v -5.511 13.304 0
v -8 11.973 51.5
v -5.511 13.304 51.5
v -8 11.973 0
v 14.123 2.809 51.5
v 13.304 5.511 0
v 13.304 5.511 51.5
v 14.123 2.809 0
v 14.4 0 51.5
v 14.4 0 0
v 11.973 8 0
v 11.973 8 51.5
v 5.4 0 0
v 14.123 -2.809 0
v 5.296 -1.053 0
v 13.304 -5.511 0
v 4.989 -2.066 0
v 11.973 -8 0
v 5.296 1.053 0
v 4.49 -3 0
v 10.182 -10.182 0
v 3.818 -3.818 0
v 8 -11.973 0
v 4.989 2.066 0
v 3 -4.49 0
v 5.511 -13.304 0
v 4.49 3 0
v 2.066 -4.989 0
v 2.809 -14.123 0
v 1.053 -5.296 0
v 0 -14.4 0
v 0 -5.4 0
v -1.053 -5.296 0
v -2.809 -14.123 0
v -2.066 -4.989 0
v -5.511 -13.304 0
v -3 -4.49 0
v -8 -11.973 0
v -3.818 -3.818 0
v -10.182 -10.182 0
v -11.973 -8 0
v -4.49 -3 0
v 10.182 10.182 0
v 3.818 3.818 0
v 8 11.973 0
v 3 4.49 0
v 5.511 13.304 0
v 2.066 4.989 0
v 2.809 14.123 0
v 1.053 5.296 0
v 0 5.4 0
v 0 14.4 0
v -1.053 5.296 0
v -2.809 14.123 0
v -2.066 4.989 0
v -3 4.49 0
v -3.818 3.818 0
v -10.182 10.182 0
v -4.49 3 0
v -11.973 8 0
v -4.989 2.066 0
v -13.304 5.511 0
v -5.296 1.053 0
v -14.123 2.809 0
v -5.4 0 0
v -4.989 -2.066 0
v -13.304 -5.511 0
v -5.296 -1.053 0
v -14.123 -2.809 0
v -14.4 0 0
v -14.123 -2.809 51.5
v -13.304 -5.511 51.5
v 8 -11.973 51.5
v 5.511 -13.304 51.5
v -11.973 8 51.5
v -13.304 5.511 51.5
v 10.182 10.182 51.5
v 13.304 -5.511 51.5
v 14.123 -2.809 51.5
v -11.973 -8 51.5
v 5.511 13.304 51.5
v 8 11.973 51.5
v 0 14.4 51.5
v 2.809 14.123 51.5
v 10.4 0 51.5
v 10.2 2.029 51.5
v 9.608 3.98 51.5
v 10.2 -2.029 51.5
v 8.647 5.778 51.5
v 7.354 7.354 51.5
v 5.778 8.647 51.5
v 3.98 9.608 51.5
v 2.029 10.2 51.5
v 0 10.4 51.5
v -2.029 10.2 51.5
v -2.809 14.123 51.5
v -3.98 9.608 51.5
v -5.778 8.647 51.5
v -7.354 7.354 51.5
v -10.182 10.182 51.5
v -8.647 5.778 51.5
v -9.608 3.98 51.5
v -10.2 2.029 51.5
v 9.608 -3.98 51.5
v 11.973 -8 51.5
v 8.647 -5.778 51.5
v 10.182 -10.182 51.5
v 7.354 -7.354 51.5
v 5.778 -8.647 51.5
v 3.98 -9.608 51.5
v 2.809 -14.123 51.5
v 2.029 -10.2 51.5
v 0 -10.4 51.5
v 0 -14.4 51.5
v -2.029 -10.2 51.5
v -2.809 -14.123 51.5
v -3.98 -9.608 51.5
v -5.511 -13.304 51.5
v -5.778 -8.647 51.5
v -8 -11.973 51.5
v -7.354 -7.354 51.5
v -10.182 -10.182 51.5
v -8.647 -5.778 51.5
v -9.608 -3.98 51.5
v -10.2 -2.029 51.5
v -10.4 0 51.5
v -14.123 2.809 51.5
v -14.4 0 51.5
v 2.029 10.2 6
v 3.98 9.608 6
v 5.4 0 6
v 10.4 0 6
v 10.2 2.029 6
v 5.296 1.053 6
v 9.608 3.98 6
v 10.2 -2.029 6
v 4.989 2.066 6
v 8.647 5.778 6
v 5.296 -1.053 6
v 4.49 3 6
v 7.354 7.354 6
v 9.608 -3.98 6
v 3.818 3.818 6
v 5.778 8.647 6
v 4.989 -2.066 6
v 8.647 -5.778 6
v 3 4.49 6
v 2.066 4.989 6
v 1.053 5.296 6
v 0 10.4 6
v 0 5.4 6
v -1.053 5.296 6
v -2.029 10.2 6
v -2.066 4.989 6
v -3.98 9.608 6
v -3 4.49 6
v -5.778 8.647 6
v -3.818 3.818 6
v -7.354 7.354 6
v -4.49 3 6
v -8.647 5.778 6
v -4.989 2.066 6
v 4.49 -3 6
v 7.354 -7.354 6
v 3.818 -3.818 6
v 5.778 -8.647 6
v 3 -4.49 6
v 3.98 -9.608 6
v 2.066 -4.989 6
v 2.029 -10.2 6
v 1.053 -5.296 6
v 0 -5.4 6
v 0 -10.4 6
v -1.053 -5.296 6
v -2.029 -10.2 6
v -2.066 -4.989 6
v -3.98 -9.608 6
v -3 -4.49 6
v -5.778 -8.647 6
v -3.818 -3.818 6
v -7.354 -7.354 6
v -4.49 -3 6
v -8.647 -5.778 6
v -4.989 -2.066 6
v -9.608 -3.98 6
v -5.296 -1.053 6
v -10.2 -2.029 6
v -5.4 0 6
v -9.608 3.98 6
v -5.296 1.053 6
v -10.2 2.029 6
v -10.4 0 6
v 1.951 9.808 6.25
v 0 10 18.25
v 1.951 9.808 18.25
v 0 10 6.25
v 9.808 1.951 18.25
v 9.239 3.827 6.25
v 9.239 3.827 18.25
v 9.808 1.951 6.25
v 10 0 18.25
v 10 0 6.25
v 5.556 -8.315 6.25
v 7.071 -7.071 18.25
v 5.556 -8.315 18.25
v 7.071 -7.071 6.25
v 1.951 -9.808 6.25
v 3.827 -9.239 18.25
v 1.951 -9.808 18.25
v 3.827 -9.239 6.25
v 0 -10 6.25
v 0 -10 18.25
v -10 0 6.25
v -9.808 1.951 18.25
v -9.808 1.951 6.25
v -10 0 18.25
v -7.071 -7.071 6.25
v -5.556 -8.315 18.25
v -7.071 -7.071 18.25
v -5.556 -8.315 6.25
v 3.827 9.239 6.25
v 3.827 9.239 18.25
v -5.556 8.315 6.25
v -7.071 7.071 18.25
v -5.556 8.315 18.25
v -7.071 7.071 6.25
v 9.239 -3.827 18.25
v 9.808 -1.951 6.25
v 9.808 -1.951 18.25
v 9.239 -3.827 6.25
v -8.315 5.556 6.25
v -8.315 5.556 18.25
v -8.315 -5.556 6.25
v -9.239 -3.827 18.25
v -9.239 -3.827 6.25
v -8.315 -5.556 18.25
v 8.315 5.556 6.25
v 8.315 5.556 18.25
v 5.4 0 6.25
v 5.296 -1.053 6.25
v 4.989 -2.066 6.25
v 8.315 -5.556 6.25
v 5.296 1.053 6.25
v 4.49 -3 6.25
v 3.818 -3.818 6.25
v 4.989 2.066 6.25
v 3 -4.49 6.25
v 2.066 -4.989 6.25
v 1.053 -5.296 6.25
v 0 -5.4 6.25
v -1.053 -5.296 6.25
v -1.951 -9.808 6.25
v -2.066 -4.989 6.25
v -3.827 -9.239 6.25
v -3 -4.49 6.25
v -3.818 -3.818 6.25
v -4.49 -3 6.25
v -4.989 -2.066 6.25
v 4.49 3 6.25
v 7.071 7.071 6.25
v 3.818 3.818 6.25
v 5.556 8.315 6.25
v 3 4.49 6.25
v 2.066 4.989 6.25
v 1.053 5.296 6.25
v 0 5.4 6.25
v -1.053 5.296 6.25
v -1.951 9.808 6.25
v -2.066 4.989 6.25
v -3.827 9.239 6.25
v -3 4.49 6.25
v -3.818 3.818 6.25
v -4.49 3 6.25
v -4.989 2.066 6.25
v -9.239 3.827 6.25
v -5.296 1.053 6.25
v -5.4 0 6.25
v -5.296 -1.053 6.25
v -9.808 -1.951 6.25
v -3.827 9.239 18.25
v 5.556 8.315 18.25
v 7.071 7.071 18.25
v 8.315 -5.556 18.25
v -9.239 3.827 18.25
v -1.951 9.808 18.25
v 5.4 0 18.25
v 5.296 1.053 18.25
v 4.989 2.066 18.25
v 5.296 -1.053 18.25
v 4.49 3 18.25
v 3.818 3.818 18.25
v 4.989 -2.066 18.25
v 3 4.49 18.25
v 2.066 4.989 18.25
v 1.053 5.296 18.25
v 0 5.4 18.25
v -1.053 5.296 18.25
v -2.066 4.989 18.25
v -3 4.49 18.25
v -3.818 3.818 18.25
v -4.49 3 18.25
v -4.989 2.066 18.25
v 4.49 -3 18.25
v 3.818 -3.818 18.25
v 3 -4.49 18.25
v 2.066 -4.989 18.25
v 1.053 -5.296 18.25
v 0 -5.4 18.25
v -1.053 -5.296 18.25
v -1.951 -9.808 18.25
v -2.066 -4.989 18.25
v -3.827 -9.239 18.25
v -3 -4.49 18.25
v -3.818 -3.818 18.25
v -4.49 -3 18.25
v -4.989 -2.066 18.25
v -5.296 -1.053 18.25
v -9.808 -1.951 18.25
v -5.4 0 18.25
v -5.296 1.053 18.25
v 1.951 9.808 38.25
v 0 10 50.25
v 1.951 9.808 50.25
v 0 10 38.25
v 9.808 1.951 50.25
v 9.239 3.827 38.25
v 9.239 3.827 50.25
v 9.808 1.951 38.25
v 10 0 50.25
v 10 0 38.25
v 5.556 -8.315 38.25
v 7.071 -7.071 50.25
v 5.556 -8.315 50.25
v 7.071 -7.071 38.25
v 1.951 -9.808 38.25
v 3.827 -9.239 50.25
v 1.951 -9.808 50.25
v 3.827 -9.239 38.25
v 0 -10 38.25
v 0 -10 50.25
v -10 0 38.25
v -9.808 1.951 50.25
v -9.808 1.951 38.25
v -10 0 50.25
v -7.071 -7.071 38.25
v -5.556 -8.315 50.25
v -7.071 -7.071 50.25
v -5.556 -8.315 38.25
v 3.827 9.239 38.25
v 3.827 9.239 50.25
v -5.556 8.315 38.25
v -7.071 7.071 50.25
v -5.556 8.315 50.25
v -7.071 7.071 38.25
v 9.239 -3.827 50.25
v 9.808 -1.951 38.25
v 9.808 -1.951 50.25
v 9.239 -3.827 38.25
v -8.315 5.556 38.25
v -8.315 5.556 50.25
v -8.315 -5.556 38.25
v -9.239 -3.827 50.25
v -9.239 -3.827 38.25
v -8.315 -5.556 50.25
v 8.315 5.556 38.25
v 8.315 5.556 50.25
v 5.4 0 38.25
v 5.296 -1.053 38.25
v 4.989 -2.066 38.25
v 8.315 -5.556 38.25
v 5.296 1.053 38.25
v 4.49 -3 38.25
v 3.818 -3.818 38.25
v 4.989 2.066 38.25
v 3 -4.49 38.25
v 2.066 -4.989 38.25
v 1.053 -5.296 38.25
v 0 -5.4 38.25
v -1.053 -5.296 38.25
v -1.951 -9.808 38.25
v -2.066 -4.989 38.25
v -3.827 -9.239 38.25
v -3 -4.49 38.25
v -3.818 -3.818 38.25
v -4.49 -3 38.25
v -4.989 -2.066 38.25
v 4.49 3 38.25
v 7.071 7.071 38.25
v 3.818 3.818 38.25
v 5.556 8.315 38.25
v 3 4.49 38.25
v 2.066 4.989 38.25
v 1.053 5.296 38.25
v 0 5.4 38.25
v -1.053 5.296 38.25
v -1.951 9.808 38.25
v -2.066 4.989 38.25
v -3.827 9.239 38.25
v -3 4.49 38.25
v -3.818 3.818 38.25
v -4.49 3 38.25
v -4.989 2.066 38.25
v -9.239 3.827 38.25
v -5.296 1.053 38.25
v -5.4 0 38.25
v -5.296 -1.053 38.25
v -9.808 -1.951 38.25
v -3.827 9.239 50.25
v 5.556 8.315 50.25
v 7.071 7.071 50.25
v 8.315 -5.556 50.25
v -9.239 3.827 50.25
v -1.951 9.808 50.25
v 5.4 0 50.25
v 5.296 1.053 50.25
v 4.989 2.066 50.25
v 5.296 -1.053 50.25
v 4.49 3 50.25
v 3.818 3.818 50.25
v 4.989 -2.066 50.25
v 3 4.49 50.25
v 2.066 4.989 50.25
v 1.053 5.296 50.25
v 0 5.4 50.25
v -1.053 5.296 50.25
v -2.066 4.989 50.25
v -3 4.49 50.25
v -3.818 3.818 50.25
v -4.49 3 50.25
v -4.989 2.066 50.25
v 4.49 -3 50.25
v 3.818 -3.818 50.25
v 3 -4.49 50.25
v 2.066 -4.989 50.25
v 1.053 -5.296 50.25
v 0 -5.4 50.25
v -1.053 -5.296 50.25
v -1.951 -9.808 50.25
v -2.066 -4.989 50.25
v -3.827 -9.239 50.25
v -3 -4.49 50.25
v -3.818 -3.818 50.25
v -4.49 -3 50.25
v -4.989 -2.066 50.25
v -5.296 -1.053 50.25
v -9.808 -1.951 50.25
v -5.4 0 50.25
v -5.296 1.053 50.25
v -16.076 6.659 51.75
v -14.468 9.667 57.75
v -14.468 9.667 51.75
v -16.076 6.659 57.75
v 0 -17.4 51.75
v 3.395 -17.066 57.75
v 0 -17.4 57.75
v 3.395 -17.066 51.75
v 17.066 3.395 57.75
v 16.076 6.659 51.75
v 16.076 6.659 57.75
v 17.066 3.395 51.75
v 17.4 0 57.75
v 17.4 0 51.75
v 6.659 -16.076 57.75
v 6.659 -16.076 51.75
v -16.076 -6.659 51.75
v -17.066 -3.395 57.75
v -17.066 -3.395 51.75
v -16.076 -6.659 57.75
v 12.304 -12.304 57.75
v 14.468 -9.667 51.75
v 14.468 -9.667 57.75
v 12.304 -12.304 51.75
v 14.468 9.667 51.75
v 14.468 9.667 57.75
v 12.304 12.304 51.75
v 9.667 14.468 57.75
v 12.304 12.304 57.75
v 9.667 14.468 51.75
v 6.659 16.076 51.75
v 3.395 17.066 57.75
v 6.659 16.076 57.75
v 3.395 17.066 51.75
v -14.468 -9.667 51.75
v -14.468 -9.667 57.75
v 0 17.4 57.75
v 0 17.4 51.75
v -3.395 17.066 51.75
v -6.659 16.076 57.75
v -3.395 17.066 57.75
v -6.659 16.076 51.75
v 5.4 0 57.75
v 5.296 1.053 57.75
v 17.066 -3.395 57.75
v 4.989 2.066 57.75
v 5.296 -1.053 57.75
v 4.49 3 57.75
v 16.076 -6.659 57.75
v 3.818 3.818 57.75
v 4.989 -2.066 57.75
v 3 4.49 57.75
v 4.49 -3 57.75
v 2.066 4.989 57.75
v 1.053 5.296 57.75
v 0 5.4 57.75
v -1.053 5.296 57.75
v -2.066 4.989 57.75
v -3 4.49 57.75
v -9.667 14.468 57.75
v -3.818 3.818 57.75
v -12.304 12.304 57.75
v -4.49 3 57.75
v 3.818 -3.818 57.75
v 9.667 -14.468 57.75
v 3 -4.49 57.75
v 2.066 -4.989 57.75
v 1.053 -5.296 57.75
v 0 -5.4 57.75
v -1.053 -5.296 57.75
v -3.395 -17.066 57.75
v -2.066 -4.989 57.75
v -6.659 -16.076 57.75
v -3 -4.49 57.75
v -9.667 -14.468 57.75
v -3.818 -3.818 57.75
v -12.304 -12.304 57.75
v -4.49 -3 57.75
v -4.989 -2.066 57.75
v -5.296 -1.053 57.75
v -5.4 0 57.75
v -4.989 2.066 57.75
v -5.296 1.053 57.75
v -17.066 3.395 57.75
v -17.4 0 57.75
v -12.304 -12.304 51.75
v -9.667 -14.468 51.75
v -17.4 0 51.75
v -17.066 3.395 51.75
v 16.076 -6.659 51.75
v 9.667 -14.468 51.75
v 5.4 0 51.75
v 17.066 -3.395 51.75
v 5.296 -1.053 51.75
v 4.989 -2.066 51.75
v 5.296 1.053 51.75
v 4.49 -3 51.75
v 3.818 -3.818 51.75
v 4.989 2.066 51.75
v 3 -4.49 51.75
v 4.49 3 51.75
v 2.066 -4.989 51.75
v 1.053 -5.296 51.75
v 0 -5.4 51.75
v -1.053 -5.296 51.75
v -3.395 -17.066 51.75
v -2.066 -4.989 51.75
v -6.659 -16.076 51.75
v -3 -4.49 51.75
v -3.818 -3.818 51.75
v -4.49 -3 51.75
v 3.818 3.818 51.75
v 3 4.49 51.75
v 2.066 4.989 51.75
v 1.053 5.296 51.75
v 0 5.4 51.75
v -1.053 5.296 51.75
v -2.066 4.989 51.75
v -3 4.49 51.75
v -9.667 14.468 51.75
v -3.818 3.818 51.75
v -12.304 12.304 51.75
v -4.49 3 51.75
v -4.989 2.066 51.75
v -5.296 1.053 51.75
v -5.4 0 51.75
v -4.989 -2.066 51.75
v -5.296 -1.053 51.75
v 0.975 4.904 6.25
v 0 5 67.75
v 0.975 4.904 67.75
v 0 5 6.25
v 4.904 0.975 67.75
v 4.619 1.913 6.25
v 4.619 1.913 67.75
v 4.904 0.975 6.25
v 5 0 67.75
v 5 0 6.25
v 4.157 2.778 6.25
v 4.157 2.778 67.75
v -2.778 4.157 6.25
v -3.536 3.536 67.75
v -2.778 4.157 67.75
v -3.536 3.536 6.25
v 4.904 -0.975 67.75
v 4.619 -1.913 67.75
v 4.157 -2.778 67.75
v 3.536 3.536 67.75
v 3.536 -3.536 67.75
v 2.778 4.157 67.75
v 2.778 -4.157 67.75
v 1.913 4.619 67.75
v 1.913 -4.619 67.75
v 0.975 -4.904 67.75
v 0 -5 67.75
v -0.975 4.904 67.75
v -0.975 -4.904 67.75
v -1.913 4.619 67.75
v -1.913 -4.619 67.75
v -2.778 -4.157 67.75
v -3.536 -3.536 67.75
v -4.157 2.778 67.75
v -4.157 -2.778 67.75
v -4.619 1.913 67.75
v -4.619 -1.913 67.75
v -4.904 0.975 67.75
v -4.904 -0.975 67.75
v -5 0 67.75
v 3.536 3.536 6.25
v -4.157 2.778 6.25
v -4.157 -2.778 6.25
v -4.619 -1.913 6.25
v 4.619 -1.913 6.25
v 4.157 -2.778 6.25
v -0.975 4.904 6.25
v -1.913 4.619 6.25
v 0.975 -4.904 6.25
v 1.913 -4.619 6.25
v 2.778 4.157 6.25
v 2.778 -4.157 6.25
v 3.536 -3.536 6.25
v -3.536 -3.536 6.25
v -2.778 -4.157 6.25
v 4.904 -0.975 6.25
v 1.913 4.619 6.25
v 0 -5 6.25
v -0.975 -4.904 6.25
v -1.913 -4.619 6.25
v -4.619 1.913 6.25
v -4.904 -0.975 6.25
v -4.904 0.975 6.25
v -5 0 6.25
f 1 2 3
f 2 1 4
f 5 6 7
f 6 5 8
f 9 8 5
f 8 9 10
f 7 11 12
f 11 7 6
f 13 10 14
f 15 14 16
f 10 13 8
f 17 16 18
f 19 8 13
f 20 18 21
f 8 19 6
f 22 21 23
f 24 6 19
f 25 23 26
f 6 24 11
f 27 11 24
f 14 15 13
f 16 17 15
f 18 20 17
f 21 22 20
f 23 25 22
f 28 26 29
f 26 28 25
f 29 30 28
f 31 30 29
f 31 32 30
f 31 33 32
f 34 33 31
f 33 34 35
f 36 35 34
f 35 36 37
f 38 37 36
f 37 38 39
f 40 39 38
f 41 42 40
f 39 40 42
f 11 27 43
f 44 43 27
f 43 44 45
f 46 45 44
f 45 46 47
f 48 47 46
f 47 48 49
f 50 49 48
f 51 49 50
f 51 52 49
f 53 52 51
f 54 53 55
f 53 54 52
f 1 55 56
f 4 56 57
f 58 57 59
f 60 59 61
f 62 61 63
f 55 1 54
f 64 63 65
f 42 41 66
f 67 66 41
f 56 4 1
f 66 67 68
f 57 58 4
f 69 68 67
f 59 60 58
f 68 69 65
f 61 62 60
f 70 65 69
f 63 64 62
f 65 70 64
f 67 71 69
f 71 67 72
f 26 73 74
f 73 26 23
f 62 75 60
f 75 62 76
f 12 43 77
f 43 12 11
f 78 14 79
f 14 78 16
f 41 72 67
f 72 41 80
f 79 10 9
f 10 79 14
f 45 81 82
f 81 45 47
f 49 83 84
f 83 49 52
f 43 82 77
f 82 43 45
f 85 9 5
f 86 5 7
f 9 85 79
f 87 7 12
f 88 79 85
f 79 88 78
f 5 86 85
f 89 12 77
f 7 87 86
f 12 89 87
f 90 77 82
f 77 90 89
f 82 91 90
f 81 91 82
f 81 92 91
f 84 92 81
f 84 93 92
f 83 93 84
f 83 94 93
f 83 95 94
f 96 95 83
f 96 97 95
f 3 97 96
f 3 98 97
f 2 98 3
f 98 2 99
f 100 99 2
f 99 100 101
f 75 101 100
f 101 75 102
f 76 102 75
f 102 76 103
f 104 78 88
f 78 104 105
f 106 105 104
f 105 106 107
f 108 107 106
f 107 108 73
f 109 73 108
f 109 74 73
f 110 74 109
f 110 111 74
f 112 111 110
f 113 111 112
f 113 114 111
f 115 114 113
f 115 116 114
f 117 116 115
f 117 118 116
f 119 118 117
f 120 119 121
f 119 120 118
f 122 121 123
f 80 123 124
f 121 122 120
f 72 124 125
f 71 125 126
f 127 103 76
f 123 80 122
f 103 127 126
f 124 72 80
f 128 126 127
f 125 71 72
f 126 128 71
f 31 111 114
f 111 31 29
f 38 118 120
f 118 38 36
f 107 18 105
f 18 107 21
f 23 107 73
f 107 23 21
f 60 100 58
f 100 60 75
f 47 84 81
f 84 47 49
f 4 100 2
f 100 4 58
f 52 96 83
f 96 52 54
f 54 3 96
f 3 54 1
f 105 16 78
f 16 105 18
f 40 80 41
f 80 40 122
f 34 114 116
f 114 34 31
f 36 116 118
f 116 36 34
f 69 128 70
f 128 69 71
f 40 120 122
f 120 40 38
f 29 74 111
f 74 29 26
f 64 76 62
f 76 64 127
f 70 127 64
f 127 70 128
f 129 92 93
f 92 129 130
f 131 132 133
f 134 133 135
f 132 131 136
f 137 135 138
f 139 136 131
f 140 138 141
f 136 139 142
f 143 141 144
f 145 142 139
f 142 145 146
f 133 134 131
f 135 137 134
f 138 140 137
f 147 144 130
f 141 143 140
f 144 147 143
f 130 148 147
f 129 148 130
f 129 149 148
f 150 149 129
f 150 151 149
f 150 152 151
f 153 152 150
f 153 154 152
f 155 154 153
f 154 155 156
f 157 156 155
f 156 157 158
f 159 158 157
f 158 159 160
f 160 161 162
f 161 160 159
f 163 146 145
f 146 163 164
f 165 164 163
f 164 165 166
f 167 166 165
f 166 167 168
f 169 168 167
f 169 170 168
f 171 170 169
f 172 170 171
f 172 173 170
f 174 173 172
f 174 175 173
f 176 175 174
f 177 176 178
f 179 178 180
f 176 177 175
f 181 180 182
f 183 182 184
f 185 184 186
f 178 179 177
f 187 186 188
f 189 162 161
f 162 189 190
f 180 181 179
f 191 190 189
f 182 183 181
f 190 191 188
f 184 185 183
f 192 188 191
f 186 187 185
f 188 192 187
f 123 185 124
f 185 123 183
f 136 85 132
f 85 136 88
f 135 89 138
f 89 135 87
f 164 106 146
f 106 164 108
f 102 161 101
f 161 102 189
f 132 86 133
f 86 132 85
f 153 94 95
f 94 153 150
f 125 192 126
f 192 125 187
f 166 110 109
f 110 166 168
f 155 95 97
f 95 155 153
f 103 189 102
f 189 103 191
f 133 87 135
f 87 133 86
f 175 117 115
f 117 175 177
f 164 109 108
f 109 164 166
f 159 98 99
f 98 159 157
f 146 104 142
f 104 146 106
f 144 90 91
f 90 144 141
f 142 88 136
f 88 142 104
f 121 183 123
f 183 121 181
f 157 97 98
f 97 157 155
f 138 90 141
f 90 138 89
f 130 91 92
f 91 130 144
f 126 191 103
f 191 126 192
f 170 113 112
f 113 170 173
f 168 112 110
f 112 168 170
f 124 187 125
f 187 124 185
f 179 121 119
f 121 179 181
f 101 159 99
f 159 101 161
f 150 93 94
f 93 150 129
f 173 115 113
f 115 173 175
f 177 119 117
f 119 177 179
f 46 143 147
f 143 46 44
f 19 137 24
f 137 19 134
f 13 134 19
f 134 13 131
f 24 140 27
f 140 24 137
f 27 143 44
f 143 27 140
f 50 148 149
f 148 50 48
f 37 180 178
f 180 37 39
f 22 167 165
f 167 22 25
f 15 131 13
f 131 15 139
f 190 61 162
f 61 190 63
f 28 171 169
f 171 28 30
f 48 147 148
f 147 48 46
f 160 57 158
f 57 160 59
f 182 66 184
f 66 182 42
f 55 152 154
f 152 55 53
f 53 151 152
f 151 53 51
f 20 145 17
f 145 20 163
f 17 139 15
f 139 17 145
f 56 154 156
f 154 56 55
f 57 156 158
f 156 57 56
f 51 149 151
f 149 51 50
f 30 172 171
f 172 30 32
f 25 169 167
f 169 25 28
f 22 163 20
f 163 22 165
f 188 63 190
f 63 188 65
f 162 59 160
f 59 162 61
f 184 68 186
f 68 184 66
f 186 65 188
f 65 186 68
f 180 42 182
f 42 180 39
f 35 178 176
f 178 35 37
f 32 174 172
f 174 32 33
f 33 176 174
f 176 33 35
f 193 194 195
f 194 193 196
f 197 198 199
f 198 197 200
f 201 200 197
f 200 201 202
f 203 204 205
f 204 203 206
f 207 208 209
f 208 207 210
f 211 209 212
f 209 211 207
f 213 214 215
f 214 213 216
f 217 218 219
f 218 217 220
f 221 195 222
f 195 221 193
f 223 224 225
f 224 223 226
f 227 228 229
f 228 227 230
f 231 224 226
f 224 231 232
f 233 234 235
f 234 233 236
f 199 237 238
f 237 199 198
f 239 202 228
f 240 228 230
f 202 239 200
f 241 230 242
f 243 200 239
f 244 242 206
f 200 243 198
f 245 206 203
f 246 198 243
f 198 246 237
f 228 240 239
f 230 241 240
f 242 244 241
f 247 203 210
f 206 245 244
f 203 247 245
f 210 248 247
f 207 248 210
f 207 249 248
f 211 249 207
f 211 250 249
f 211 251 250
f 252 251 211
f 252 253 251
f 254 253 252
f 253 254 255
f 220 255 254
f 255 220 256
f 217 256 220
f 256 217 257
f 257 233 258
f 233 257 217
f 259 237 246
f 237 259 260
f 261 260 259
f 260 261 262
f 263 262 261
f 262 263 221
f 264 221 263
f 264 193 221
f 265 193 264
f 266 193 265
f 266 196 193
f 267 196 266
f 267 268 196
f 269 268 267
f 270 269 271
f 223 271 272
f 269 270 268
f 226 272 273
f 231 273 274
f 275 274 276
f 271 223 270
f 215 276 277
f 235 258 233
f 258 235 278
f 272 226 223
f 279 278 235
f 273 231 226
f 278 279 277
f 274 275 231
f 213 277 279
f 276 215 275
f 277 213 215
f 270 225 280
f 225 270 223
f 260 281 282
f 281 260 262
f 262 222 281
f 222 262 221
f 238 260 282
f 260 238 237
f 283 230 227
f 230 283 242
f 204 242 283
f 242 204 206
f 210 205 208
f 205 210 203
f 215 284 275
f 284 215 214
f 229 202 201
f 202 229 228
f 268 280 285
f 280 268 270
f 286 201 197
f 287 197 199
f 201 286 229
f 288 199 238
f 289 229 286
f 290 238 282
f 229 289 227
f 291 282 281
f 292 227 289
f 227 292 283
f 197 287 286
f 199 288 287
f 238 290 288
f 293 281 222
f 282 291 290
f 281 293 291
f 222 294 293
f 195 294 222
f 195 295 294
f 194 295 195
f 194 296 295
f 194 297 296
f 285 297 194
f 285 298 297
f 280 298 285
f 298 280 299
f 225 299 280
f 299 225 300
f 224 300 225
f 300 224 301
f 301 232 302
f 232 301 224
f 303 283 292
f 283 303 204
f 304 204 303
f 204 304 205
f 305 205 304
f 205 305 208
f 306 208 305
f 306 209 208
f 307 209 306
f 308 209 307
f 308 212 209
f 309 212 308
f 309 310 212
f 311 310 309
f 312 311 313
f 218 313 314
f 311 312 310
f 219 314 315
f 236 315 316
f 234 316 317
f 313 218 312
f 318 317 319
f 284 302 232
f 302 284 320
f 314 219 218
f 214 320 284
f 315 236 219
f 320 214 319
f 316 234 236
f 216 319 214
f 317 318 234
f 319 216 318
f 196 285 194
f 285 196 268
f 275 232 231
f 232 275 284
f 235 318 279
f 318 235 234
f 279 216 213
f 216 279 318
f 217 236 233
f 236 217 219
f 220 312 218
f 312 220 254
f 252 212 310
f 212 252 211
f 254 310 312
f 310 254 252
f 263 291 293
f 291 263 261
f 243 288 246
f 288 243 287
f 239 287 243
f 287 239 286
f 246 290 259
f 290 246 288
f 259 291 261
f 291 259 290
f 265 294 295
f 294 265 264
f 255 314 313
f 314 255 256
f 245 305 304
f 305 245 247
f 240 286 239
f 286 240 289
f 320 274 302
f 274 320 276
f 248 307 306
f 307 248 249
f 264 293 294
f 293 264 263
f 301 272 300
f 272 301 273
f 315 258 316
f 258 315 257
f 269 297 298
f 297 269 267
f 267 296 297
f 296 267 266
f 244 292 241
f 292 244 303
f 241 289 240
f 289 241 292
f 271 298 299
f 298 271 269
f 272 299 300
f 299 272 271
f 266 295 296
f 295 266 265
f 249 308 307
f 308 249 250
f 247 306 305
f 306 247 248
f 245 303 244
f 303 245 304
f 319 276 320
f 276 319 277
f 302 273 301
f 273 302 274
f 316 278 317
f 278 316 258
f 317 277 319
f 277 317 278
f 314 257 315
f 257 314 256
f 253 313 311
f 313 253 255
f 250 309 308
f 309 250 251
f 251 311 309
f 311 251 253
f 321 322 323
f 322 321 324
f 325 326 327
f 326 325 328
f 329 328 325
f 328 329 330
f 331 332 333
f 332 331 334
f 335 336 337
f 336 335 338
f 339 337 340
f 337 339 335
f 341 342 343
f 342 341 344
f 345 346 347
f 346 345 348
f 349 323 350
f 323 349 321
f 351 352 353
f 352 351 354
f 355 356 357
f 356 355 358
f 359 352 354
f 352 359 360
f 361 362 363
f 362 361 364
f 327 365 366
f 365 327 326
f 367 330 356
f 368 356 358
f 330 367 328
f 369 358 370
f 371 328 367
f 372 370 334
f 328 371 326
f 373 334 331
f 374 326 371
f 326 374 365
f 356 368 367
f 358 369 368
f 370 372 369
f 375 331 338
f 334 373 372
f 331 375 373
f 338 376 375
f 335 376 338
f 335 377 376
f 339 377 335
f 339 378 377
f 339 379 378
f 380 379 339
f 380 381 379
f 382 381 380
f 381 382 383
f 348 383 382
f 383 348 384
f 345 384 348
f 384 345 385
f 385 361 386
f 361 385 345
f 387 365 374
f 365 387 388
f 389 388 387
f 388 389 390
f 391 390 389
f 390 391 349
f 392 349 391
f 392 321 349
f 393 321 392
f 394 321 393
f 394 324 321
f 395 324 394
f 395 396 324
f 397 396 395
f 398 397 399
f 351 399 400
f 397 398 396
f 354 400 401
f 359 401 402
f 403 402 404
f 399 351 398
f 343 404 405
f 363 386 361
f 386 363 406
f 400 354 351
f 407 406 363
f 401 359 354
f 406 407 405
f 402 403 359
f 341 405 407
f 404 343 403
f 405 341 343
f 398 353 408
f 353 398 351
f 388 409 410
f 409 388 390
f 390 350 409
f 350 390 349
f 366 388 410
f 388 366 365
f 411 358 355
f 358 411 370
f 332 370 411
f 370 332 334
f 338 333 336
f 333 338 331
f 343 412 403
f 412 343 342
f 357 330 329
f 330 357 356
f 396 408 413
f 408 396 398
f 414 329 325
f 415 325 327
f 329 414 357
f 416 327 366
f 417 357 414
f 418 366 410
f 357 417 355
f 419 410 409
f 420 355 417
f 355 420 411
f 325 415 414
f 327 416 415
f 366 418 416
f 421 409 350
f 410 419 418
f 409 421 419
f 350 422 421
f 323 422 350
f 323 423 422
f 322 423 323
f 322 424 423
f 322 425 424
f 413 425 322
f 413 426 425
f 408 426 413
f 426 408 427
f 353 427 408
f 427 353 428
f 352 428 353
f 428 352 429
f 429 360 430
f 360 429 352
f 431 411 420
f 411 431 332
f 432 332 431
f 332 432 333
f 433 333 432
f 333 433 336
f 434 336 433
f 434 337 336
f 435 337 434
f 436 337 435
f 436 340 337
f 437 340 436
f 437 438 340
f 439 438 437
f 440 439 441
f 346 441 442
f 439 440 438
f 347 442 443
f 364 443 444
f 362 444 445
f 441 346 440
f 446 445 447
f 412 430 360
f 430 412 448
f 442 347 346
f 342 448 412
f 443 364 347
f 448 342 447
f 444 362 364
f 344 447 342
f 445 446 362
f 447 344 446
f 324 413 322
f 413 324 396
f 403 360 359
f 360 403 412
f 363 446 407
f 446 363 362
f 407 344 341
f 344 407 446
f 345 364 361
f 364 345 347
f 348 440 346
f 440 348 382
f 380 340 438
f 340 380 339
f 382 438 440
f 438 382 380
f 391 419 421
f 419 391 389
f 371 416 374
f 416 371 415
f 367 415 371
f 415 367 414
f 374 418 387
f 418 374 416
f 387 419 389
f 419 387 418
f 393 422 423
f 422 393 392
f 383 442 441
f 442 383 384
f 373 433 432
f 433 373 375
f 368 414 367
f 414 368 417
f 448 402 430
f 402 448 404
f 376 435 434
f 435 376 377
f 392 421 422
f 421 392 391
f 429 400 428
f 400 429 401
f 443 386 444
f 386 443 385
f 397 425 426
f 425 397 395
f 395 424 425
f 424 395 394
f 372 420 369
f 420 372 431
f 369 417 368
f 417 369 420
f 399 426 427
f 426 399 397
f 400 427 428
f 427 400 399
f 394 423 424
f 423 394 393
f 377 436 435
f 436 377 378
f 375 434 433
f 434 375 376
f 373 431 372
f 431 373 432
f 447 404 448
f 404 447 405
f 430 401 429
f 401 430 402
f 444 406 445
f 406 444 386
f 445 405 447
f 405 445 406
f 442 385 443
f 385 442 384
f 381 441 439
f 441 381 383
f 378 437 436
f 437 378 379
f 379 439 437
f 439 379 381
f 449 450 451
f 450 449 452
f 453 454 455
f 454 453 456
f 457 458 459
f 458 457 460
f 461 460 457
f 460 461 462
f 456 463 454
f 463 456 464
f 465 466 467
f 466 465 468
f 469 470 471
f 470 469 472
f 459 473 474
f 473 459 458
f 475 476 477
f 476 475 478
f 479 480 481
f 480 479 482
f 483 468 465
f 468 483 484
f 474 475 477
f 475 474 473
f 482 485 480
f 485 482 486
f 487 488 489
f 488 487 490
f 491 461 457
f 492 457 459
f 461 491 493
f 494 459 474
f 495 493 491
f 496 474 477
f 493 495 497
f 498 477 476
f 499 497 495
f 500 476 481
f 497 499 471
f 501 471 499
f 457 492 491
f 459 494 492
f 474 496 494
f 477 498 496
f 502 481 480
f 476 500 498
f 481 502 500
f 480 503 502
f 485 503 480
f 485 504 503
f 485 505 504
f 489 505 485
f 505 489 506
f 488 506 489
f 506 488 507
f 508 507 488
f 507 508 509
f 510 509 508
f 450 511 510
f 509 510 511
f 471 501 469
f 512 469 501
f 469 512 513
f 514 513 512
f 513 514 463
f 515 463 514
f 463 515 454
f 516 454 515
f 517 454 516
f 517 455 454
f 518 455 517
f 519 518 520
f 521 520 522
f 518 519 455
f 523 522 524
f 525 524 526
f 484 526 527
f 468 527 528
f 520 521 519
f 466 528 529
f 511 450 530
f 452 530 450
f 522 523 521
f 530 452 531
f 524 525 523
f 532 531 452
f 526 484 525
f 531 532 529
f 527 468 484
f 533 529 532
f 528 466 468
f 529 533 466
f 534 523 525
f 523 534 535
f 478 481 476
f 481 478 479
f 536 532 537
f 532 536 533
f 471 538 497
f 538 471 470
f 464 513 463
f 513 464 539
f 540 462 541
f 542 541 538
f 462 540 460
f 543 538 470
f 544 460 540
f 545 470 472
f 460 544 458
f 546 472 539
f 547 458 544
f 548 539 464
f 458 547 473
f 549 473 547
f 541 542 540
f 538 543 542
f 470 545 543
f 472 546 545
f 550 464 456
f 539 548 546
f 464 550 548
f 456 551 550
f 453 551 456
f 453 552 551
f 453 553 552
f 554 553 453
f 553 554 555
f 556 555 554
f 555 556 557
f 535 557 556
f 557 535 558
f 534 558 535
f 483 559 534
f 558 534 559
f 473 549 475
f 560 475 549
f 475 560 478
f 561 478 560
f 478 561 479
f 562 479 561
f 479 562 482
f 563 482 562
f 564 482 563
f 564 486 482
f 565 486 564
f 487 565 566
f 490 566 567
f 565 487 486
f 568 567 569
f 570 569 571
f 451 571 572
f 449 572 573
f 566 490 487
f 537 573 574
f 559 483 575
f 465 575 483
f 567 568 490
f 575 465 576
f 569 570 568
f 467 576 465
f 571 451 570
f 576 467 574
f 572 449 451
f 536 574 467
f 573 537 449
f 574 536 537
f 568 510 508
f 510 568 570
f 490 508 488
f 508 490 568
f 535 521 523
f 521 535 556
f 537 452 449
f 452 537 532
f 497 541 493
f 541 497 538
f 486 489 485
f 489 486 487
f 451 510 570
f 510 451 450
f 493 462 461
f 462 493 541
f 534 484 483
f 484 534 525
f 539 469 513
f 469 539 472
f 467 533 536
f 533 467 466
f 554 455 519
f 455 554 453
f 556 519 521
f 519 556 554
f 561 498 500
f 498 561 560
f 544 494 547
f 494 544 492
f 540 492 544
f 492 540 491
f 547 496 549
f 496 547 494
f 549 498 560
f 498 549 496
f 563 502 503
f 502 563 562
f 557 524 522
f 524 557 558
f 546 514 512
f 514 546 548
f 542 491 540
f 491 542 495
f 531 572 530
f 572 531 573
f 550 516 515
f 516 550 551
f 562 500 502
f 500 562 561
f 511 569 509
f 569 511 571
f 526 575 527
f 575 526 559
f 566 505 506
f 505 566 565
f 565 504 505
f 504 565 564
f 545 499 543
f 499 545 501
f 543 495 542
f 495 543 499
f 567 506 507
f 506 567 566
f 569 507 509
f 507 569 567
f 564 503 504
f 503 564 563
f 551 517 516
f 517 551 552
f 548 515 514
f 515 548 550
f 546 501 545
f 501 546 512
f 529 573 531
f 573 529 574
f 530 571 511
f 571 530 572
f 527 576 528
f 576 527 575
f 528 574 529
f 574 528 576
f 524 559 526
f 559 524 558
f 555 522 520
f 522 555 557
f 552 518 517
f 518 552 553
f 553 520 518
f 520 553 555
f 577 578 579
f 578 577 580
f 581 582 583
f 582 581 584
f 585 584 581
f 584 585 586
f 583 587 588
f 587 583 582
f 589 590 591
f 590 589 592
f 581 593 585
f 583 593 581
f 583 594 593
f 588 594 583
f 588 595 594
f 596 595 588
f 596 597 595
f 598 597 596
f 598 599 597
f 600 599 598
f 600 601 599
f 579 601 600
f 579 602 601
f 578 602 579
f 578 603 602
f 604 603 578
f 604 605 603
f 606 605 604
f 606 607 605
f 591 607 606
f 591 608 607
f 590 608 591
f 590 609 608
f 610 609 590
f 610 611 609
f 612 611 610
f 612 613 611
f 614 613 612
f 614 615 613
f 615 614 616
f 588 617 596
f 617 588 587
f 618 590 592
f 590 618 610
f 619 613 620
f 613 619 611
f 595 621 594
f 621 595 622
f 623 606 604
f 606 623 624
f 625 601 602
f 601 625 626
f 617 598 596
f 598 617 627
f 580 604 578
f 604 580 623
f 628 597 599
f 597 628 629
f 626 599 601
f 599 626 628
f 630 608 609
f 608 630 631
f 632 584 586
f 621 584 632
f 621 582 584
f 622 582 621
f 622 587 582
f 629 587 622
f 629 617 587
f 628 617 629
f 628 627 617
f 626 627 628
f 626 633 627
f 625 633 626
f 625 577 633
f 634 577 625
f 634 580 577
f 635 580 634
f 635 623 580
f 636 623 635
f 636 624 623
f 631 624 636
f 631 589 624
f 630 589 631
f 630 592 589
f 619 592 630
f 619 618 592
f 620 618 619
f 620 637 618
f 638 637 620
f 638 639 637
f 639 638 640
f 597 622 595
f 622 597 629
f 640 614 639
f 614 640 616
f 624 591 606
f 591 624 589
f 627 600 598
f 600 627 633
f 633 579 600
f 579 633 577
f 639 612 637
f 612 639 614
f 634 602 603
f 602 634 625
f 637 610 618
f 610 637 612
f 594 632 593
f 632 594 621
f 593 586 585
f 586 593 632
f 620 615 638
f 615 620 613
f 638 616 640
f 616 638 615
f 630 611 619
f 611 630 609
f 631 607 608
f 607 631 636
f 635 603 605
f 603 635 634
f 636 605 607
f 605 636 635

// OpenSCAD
$fn = 32;

// ------------------------------------------------------------------------
// Shaft station: cup d28.8 x 51.5 mm, shaft d10
// Every part is its own module, assembly() places every instance.
// ------------------------------------------------------------------------

// --- part 1 ---
module housing_cup() {
  difference() {
    cylinder(h = 51.5, d = 28.8);
    translate([0, 0, 6]) cylinder(h = 46.5, d = 20.8);
    translate([0, 0, -1]) cylinder(h = 8, d = 10.8);
  }
}

// --- part 2 ---
module bearing_lower() {
  difference() {
      translate([0, 0, 0]) cylinder(h = 12, d = 20);
      translate([0, 0, -1]) cylinder(h = 14, d = 10.8);
    }
}

// --- part 3 ---
module bearing_upper() {
  difference() {
      translate([0, 0, 0]) cylinder(h = 12, d = 20);
      translate([0, 0, -1]) cylinder(h = 14, d = 10.8);
    }
}

// --- part 4 ---
module station_shaft() {
  translate([0, 0, -30.75]) cylinder(h = 61.5, d = 10);
}

// --- part 5 ---
module station_cover() {
  difference() {
    cylinder(h = 6, d = 34.8);
    translate([0, 0, -1]) cylinder(h = 8, d = 10.8);
  }
}

// --- assembly ---
module assembly() {
  color([0.80, 0.24, 0.20]) translate([0, 0, 0]) rotate([0, 0, 0]) housing_cup();
  color([0.20, 0.45, 0.75]) translate([0, 0, 6.25]) rotate([0, 0, 0]) bearing_lower();
  color([0.25, 0.62, 0.32]) translate([0, 0, 38.25]) rotate([0, 0, 0]) bearing_upper();
  color([0.92, 0.70, 0.18]) translate([0, 0, 37]) rotate([0, 0, 0]) station_shaft();
  color([0.58, 0.35, 0.70]) translate([0, 0, 51.75]) rotate([0, 0, 0]) station_cover();
}

assembly();
